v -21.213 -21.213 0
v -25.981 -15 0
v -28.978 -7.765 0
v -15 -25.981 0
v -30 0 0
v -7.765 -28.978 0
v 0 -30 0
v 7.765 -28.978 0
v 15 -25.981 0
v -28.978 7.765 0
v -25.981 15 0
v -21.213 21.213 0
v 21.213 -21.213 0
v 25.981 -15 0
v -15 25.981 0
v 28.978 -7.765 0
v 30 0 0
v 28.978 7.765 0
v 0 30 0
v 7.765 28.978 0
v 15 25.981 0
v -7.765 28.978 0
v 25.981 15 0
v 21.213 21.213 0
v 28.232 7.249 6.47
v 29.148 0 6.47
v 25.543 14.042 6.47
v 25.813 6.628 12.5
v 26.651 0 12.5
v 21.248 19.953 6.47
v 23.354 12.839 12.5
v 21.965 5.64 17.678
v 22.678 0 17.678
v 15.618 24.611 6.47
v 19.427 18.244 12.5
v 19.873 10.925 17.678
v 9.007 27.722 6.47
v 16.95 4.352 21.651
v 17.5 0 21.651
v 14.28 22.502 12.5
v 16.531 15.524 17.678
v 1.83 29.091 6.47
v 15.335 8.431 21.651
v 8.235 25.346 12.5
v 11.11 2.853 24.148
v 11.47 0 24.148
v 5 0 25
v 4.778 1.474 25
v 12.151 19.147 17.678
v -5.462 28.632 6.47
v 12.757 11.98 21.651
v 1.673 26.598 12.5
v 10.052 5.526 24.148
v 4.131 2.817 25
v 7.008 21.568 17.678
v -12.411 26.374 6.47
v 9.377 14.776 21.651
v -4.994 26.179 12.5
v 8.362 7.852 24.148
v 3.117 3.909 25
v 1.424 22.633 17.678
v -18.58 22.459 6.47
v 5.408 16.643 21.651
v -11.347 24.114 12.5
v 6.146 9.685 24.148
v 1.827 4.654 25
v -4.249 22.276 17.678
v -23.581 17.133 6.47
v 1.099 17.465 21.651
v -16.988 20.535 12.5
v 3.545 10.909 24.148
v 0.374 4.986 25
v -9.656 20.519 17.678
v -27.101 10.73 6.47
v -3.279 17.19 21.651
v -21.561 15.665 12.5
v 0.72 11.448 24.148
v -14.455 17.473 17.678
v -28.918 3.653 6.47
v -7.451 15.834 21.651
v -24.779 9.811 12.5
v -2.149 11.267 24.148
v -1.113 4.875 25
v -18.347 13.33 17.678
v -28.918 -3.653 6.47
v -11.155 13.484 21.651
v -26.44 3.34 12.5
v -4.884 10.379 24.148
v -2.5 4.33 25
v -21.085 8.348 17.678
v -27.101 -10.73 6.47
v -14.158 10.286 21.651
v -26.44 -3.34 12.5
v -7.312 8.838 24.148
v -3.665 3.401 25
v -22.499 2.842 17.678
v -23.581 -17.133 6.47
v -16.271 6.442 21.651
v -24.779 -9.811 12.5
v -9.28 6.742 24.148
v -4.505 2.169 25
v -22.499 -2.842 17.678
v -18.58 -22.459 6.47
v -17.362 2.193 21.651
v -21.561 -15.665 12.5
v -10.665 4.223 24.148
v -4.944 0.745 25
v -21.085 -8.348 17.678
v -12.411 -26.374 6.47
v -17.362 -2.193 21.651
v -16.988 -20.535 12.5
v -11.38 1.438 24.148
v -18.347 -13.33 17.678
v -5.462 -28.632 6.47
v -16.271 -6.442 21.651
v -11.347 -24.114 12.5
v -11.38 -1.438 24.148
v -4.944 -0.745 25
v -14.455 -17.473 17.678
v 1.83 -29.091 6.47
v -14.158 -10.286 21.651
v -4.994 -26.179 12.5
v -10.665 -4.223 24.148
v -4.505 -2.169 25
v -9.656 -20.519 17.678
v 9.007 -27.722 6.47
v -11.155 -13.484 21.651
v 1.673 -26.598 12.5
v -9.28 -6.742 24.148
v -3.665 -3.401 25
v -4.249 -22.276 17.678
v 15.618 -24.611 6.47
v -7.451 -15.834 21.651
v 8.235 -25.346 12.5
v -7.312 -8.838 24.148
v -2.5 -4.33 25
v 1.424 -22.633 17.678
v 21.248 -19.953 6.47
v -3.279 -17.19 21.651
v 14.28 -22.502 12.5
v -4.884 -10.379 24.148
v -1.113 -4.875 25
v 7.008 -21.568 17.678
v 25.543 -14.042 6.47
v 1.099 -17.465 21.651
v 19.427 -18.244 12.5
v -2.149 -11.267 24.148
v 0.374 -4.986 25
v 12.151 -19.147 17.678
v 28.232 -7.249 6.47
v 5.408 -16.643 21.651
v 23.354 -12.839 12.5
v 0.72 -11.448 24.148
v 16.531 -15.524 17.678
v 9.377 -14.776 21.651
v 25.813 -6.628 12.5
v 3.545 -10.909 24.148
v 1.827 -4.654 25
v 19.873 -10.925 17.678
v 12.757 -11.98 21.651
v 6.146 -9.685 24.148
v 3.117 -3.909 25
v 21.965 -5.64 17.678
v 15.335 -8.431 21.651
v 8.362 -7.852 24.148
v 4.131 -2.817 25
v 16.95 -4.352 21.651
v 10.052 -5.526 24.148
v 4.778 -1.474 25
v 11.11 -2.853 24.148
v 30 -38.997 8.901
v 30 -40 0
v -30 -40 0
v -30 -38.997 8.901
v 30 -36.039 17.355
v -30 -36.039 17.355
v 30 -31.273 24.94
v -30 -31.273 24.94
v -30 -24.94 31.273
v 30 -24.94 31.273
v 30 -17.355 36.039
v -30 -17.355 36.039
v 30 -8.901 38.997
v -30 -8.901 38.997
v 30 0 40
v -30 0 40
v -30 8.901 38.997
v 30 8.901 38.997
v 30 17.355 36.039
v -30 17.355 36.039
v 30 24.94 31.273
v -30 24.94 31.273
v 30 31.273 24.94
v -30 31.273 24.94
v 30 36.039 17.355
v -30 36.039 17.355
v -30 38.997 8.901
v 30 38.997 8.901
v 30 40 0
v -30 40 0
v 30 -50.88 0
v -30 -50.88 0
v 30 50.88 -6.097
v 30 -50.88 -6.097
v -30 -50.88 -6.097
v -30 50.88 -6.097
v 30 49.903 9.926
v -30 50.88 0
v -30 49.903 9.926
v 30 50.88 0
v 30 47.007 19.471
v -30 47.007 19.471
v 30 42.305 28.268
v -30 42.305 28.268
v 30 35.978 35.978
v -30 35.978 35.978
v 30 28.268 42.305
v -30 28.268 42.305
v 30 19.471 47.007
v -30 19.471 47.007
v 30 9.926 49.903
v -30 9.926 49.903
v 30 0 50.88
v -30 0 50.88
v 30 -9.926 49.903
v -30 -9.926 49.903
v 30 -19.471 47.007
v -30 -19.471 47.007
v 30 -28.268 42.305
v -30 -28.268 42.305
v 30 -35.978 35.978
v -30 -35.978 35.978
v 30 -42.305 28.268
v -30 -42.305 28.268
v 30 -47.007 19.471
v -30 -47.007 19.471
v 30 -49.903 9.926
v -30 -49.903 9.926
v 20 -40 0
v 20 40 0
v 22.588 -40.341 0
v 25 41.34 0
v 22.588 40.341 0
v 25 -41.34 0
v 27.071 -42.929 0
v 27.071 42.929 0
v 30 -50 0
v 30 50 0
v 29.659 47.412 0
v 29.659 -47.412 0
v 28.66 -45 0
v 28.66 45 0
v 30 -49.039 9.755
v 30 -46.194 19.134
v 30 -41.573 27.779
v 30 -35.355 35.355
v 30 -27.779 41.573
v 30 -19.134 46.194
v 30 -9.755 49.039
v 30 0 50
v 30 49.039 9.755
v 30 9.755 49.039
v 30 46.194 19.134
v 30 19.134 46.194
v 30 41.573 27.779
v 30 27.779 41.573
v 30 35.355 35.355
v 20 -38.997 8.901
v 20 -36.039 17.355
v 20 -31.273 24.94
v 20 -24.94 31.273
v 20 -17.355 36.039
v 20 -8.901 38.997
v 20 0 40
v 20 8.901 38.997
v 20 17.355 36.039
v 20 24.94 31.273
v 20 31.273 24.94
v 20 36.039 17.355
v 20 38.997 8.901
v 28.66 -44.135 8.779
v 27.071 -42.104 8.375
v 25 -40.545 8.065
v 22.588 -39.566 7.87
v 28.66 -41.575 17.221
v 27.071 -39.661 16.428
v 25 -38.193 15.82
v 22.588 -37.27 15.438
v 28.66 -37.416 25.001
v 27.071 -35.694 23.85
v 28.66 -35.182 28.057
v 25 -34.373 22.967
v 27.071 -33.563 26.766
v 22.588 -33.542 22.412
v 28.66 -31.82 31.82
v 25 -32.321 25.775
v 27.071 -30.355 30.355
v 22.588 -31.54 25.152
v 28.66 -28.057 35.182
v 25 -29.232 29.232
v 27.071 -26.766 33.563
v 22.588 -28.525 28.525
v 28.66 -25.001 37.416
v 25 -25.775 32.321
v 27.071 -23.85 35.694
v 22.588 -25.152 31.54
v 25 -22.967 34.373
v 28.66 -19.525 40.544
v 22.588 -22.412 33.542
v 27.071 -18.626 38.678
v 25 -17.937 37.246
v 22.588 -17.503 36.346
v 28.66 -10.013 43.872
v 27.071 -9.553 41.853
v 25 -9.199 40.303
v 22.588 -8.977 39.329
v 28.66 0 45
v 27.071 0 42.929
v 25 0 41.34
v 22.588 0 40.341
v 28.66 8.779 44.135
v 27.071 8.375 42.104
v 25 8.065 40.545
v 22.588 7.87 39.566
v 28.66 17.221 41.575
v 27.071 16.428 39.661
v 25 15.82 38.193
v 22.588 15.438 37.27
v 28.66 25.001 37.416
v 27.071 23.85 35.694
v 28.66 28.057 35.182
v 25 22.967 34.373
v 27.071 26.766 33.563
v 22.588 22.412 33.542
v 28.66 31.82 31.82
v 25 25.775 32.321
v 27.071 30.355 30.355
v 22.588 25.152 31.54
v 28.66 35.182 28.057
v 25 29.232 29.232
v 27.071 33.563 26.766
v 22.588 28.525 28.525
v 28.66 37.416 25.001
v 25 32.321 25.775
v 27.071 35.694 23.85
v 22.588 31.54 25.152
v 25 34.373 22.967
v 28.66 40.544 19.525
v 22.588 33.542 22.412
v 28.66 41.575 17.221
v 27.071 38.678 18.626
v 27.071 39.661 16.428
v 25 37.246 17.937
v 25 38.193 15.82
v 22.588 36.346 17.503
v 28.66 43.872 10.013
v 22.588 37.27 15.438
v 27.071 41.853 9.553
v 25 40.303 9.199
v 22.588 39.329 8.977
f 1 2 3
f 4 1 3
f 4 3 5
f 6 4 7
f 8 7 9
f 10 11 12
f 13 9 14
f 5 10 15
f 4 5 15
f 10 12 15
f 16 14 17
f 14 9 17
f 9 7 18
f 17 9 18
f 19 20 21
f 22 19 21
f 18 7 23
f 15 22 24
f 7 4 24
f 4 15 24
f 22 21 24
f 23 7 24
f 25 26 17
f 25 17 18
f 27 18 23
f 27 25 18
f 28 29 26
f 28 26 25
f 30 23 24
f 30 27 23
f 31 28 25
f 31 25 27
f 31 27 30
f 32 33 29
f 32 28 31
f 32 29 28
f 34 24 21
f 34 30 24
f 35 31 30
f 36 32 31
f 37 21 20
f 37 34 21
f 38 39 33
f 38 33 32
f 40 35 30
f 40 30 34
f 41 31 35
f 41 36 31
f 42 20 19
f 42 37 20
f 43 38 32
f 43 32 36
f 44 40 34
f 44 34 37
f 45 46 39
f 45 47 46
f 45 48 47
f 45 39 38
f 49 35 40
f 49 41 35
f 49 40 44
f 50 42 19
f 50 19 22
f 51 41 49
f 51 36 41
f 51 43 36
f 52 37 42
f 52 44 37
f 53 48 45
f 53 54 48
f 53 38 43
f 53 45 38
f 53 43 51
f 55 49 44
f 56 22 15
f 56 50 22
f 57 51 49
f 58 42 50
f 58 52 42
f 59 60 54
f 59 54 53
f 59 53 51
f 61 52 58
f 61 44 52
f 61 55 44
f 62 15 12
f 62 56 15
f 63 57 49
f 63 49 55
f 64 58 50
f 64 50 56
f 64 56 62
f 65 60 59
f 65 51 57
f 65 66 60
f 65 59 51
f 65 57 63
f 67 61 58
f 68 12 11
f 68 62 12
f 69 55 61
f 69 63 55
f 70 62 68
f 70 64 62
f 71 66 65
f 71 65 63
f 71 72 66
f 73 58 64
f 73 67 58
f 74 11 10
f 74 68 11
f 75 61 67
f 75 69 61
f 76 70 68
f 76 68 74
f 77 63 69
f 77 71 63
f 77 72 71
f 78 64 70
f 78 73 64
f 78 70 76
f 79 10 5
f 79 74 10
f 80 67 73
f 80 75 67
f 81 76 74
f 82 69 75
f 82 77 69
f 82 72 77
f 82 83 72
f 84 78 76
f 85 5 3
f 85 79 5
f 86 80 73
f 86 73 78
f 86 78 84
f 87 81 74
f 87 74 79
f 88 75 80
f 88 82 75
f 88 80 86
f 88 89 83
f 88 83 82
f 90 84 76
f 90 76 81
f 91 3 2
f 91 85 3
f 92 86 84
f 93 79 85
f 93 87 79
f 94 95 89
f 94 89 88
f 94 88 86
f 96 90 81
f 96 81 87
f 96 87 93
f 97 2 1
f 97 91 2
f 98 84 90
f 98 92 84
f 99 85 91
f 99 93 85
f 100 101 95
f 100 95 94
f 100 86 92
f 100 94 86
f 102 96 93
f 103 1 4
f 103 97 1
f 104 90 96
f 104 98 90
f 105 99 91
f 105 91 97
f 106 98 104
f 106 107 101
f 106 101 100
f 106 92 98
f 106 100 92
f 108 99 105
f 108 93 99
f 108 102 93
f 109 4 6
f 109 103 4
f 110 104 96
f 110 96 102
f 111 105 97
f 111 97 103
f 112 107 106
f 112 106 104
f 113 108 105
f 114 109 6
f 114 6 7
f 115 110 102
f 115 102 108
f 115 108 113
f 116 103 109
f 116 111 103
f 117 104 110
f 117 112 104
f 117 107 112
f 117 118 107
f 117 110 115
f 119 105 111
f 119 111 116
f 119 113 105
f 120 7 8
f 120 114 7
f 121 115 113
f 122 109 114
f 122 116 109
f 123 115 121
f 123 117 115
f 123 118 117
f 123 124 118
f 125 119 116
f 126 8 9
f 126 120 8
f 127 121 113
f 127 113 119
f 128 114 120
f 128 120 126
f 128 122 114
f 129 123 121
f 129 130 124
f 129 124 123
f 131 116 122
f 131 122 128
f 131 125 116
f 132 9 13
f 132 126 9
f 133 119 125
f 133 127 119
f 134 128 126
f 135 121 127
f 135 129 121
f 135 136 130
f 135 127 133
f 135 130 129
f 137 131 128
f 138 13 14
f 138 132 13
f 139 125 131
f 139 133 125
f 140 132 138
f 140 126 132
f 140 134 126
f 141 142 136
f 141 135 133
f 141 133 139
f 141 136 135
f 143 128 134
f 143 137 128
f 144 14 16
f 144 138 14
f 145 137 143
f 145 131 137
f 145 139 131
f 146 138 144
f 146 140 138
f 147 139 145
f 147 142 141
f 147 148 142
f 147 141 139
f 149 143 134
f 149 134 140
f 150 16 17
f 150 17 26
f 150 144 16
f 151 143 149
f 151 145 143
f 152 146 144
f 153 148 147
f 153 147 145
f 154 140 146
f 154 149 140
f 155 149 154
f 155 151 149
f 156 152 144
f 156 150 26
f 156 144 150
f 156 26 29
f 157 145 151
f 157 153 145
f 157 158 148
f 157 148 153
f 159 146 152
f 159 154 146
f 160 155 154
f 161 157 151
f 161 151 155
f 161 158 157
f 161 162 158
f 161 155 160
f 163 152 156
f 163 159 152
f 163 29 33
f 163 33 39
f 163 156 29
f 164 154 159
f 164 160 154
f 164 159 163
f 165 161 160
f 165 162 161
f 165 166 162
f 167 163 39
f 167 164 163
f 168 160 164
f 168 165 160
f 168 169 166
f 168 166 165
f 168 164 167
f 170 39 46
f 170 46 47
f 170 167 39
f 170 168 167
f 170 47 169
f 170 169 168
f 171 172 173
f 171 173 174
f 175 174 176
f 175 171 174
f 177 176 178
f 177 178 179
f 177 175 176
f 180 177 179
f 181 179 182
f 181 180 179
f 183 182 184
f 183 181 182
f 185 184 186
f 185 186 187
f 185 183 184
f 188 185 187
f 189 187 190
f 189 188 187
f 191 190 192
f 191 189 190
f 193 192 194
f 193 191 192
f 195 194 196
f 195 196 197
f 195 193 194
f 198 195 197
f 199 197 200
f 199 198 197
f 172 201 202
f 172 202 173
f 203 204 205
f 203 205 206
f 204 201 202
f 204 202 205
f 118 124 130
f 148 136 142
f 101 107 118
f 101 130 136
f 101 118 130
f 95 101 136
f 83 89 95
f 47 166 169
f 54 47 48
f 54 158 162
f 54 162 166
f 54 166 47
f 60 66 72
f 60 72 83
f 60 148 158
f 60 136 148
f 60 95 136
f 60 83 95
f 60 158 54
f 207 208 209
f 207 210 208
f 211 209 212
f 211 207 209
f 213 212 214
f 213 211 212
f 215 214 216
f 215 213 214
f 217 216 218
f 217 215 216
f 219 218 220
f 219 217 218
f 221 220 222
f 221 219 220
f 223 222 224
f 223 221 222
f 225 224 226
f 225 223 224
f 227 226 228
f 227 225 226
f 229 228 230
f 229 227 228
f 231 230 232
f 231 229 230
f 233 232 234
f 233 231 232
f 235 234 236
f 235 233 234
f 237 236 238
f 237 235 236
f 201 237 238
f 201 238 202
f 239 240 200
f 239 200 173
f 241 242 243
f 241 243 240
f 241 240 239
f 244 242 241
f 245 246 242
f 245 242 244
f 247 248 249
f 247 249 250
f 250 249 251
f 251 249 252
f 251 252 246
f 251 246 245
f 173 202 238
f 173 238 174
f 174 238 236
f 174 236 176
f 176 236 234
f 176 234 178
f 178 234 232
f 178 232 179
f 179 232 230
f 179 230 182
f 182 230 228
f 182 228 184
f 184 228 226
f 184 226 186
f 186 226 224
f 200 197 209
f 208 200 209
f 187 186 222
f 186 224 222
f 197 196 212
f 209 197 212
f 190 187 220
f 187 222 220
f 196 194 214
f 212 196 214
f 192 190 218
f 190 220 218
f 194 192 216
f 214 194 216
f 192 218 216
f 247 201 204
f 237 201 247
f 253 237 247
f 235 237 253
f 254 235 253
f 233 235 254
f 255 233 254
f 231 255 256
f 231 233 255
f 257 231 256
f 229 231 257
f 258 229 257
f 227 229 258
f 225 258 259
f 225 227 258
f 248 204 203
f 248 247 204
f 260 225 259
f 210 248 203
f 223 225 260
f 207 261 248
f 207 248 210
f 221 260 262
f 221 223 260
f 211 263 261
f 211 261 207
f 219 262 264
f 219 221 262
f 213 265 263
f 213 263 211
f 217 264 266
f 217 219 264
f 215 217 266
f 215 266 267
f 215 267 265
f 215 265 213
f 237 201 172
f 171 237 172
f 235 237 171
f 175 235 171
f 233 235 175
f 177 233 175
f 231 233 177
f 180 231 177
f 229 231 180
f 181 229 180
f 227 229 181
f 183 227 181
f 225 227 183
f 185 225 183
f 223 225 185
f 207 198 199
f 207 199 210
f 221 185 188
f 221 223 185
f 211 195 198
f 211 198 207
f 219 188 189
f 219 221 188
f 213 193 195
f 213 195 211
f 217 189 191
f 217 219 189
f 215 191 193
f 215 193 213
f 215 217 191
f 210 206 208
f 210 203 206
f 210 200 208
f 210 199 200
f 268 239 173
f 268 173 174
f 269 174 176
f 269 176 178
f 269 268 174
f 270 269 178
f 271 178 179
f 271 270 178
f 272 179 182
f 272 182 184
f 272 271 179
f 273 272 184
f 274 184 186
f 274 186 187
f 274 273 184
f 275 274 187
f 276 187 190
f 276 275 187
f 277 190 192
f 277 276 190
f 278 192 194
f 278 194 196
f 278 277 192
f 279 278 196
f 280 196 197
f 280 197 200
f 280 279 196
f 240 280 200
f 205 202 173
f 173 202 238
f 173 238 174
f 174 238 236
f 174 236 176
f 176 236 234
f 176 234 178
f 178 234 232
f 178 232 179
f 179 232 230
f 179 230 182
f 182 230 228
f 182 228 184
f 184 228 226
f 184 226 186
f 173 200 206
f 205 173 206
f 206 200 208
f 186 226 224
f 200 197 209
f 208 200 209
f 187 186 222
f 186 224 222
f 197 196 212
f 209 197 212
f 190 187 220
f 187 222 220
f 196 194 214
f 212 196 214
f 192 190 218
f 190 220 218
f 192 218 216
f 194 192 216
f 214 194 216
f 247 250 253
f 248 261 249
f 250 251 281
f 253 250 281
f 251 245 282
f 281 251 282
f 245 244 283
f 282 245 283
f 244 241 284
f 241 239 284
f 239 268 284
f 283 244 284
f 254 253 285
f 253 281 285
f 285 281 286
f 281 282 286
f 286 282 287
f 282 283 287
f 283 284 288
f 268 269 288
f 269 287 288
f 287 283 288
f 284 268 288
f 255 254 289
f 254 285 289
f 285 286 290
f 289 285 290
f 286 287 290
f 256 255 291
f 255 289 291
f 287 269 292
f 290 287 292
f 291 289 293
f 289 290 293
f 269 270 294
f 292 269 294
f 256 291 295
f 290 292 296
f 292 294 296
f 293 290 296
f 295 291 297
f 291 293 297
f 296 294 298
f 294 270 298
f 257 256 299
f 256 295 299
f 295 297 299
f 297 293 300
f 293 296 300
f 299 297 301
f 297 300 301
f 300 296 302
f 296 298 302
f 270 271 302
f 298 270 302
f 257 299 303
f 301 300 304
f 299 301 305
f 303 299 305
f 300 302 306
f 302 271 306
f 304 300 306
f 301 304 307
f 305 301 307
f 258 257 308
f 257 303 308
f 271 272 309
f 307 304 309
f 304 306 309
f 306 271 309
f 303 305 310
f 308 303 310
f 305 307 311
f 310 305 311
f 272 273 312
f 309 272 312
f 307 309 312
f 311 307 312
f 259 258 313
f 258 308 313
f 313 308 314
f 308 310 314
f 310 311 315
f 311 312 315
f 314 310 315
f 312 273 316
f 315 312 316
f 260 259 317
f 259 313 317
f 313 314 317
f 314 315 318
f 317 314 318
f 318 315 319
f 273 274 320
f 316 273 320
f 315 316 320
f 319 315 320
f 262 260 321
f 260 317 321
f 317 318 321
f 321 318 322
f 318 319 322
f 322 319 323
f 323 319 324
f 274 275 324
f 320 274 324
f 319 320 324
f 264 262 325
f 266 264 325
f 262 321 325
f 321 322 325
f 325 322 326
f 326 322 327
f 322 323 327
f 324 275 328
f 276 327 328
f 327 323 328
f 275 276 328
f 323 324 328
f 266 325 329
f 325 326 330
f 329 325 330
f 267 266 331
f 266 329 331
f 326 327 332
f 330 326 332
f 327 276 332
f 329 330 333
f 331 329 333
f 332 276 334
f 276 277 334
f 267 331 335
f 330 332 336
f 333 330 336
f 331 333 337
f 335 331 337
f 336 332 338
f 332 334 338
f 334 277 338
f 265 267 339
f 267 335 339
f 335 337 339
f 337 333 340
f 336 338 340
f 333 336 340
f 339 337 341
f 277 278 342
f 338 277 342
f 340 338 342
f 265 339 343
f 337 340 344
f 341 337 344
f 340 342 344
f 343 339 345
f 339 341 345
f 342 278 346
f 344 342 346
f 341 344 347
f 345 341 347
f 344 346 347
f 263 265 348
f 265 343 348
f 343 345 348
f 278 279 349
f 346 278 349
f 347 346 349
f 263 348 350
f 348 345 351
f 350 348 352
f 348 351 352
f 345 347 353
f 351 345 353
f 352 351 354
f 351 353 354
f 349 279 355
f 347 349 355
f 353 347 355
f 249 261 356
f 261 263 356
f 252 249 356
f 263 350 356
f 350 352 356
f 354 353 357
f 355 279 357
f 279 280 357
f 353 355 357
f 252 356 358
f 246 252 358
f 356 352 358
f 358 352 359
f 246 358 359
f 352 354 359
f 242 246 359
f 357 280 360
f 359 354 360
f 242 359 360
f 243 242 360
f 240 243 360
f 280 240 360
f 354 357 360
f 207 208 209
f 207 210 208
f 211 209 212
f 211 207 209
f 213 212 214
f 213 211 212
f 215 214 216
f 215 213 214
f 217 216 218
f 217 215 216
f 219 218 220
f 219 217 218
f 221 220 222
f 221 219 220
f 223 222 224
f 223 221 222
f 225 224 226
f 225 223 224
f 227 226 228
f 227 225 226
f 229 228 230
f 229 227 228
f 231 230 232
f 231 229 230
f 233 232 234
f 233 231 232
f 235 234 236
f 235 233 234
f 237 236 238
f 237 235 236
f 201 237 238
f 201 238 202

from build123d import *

# Parameters (mm, degrees)
F0_R          = 30
F1_DEPTH      = 25
F2_R          = 24.99999
F4_DEPTH      = 30
F4_DEPTH_BACK = 30
F5_DEPTH      = 30
F5_DEPTH_BACK = 30
F6_R          = 10


# Not quite as in the source:
# - a fillet or chamfer is up to 0.001 mm smaller than in the source, because OpenCascade refuses the exact size


with BuildPart() as f1:
    # F0 (on Top) → F1 (new body)
    with BuildSketch(Plane.XY):
        Circle(F0_R)
    extrude(amount=F1_DEPTH)

    # F2 (radius 25 in the source; OpenCascade refuses exactly that, so slightly less here)
    f2_edges = [f1.edges().sort_by_distance(p)[0] for p in [
        (-30, 0, 25),
    ]]
    fillet(f2_edges, radius=F2_R)


with BuildPart() as f4:
    # F3 (on Right) → F4 (new body, two sides)
    with BuildSketch(Plane.YZ) as f4_sk:
        with BuildLine():
            ThreePointArc((50.8803409753, 0), (0, 50.8803409753), (-50.8803409753, 0))
            Line((-50.8803409753, 0), (-40, 0))
            ThreePointArc((-40, 0), (0, 40), (40, 0))
            Line((40, 0), (50.8803409753, 0))
        make_face()
    extrude(amount=F4_DEPTH)
    extrude(f4_sk.sketch, amount=-F4_DEPTH_BACK)


with BuildPart() as f5:
    # F3 (on Right) → F5 (new body, two sides)
    with BuildSketch(Plane.YZ) as f5_sk:
        with BuildLine():
            ThreePointArc((50.8803409753, 0), (0, 50.8803409753), (-50.8803409753, 0))
            Line((-50.8803409753, 0), (-40, 0))
            ThreePointArc((-40, 0), (0, 40), (40, 0))
            Line((40, 0), (50.8803409753, 0))
        make_face()
        Polygon((-40, 0), (-50.8803409753, 0), (-50.8803409753, -6.0972881854), (50.8803409753, -6.0972881854), (50.8803409753, 0), (40, 0), align=None)
    extrude(amount=F5_DEPTH)
    extrude(f5_sk.sketch, amount=-F5_DEPTH_BACK)

    # F6
    f6_edges = [f5.edges().sort_by_distance(p)[0] for p in [
        (30, 0, 40),
    ]]
    fillet(f6_edges, radius=F6_R)


solid = Compound([f1.part, f4.part, f5.part])
